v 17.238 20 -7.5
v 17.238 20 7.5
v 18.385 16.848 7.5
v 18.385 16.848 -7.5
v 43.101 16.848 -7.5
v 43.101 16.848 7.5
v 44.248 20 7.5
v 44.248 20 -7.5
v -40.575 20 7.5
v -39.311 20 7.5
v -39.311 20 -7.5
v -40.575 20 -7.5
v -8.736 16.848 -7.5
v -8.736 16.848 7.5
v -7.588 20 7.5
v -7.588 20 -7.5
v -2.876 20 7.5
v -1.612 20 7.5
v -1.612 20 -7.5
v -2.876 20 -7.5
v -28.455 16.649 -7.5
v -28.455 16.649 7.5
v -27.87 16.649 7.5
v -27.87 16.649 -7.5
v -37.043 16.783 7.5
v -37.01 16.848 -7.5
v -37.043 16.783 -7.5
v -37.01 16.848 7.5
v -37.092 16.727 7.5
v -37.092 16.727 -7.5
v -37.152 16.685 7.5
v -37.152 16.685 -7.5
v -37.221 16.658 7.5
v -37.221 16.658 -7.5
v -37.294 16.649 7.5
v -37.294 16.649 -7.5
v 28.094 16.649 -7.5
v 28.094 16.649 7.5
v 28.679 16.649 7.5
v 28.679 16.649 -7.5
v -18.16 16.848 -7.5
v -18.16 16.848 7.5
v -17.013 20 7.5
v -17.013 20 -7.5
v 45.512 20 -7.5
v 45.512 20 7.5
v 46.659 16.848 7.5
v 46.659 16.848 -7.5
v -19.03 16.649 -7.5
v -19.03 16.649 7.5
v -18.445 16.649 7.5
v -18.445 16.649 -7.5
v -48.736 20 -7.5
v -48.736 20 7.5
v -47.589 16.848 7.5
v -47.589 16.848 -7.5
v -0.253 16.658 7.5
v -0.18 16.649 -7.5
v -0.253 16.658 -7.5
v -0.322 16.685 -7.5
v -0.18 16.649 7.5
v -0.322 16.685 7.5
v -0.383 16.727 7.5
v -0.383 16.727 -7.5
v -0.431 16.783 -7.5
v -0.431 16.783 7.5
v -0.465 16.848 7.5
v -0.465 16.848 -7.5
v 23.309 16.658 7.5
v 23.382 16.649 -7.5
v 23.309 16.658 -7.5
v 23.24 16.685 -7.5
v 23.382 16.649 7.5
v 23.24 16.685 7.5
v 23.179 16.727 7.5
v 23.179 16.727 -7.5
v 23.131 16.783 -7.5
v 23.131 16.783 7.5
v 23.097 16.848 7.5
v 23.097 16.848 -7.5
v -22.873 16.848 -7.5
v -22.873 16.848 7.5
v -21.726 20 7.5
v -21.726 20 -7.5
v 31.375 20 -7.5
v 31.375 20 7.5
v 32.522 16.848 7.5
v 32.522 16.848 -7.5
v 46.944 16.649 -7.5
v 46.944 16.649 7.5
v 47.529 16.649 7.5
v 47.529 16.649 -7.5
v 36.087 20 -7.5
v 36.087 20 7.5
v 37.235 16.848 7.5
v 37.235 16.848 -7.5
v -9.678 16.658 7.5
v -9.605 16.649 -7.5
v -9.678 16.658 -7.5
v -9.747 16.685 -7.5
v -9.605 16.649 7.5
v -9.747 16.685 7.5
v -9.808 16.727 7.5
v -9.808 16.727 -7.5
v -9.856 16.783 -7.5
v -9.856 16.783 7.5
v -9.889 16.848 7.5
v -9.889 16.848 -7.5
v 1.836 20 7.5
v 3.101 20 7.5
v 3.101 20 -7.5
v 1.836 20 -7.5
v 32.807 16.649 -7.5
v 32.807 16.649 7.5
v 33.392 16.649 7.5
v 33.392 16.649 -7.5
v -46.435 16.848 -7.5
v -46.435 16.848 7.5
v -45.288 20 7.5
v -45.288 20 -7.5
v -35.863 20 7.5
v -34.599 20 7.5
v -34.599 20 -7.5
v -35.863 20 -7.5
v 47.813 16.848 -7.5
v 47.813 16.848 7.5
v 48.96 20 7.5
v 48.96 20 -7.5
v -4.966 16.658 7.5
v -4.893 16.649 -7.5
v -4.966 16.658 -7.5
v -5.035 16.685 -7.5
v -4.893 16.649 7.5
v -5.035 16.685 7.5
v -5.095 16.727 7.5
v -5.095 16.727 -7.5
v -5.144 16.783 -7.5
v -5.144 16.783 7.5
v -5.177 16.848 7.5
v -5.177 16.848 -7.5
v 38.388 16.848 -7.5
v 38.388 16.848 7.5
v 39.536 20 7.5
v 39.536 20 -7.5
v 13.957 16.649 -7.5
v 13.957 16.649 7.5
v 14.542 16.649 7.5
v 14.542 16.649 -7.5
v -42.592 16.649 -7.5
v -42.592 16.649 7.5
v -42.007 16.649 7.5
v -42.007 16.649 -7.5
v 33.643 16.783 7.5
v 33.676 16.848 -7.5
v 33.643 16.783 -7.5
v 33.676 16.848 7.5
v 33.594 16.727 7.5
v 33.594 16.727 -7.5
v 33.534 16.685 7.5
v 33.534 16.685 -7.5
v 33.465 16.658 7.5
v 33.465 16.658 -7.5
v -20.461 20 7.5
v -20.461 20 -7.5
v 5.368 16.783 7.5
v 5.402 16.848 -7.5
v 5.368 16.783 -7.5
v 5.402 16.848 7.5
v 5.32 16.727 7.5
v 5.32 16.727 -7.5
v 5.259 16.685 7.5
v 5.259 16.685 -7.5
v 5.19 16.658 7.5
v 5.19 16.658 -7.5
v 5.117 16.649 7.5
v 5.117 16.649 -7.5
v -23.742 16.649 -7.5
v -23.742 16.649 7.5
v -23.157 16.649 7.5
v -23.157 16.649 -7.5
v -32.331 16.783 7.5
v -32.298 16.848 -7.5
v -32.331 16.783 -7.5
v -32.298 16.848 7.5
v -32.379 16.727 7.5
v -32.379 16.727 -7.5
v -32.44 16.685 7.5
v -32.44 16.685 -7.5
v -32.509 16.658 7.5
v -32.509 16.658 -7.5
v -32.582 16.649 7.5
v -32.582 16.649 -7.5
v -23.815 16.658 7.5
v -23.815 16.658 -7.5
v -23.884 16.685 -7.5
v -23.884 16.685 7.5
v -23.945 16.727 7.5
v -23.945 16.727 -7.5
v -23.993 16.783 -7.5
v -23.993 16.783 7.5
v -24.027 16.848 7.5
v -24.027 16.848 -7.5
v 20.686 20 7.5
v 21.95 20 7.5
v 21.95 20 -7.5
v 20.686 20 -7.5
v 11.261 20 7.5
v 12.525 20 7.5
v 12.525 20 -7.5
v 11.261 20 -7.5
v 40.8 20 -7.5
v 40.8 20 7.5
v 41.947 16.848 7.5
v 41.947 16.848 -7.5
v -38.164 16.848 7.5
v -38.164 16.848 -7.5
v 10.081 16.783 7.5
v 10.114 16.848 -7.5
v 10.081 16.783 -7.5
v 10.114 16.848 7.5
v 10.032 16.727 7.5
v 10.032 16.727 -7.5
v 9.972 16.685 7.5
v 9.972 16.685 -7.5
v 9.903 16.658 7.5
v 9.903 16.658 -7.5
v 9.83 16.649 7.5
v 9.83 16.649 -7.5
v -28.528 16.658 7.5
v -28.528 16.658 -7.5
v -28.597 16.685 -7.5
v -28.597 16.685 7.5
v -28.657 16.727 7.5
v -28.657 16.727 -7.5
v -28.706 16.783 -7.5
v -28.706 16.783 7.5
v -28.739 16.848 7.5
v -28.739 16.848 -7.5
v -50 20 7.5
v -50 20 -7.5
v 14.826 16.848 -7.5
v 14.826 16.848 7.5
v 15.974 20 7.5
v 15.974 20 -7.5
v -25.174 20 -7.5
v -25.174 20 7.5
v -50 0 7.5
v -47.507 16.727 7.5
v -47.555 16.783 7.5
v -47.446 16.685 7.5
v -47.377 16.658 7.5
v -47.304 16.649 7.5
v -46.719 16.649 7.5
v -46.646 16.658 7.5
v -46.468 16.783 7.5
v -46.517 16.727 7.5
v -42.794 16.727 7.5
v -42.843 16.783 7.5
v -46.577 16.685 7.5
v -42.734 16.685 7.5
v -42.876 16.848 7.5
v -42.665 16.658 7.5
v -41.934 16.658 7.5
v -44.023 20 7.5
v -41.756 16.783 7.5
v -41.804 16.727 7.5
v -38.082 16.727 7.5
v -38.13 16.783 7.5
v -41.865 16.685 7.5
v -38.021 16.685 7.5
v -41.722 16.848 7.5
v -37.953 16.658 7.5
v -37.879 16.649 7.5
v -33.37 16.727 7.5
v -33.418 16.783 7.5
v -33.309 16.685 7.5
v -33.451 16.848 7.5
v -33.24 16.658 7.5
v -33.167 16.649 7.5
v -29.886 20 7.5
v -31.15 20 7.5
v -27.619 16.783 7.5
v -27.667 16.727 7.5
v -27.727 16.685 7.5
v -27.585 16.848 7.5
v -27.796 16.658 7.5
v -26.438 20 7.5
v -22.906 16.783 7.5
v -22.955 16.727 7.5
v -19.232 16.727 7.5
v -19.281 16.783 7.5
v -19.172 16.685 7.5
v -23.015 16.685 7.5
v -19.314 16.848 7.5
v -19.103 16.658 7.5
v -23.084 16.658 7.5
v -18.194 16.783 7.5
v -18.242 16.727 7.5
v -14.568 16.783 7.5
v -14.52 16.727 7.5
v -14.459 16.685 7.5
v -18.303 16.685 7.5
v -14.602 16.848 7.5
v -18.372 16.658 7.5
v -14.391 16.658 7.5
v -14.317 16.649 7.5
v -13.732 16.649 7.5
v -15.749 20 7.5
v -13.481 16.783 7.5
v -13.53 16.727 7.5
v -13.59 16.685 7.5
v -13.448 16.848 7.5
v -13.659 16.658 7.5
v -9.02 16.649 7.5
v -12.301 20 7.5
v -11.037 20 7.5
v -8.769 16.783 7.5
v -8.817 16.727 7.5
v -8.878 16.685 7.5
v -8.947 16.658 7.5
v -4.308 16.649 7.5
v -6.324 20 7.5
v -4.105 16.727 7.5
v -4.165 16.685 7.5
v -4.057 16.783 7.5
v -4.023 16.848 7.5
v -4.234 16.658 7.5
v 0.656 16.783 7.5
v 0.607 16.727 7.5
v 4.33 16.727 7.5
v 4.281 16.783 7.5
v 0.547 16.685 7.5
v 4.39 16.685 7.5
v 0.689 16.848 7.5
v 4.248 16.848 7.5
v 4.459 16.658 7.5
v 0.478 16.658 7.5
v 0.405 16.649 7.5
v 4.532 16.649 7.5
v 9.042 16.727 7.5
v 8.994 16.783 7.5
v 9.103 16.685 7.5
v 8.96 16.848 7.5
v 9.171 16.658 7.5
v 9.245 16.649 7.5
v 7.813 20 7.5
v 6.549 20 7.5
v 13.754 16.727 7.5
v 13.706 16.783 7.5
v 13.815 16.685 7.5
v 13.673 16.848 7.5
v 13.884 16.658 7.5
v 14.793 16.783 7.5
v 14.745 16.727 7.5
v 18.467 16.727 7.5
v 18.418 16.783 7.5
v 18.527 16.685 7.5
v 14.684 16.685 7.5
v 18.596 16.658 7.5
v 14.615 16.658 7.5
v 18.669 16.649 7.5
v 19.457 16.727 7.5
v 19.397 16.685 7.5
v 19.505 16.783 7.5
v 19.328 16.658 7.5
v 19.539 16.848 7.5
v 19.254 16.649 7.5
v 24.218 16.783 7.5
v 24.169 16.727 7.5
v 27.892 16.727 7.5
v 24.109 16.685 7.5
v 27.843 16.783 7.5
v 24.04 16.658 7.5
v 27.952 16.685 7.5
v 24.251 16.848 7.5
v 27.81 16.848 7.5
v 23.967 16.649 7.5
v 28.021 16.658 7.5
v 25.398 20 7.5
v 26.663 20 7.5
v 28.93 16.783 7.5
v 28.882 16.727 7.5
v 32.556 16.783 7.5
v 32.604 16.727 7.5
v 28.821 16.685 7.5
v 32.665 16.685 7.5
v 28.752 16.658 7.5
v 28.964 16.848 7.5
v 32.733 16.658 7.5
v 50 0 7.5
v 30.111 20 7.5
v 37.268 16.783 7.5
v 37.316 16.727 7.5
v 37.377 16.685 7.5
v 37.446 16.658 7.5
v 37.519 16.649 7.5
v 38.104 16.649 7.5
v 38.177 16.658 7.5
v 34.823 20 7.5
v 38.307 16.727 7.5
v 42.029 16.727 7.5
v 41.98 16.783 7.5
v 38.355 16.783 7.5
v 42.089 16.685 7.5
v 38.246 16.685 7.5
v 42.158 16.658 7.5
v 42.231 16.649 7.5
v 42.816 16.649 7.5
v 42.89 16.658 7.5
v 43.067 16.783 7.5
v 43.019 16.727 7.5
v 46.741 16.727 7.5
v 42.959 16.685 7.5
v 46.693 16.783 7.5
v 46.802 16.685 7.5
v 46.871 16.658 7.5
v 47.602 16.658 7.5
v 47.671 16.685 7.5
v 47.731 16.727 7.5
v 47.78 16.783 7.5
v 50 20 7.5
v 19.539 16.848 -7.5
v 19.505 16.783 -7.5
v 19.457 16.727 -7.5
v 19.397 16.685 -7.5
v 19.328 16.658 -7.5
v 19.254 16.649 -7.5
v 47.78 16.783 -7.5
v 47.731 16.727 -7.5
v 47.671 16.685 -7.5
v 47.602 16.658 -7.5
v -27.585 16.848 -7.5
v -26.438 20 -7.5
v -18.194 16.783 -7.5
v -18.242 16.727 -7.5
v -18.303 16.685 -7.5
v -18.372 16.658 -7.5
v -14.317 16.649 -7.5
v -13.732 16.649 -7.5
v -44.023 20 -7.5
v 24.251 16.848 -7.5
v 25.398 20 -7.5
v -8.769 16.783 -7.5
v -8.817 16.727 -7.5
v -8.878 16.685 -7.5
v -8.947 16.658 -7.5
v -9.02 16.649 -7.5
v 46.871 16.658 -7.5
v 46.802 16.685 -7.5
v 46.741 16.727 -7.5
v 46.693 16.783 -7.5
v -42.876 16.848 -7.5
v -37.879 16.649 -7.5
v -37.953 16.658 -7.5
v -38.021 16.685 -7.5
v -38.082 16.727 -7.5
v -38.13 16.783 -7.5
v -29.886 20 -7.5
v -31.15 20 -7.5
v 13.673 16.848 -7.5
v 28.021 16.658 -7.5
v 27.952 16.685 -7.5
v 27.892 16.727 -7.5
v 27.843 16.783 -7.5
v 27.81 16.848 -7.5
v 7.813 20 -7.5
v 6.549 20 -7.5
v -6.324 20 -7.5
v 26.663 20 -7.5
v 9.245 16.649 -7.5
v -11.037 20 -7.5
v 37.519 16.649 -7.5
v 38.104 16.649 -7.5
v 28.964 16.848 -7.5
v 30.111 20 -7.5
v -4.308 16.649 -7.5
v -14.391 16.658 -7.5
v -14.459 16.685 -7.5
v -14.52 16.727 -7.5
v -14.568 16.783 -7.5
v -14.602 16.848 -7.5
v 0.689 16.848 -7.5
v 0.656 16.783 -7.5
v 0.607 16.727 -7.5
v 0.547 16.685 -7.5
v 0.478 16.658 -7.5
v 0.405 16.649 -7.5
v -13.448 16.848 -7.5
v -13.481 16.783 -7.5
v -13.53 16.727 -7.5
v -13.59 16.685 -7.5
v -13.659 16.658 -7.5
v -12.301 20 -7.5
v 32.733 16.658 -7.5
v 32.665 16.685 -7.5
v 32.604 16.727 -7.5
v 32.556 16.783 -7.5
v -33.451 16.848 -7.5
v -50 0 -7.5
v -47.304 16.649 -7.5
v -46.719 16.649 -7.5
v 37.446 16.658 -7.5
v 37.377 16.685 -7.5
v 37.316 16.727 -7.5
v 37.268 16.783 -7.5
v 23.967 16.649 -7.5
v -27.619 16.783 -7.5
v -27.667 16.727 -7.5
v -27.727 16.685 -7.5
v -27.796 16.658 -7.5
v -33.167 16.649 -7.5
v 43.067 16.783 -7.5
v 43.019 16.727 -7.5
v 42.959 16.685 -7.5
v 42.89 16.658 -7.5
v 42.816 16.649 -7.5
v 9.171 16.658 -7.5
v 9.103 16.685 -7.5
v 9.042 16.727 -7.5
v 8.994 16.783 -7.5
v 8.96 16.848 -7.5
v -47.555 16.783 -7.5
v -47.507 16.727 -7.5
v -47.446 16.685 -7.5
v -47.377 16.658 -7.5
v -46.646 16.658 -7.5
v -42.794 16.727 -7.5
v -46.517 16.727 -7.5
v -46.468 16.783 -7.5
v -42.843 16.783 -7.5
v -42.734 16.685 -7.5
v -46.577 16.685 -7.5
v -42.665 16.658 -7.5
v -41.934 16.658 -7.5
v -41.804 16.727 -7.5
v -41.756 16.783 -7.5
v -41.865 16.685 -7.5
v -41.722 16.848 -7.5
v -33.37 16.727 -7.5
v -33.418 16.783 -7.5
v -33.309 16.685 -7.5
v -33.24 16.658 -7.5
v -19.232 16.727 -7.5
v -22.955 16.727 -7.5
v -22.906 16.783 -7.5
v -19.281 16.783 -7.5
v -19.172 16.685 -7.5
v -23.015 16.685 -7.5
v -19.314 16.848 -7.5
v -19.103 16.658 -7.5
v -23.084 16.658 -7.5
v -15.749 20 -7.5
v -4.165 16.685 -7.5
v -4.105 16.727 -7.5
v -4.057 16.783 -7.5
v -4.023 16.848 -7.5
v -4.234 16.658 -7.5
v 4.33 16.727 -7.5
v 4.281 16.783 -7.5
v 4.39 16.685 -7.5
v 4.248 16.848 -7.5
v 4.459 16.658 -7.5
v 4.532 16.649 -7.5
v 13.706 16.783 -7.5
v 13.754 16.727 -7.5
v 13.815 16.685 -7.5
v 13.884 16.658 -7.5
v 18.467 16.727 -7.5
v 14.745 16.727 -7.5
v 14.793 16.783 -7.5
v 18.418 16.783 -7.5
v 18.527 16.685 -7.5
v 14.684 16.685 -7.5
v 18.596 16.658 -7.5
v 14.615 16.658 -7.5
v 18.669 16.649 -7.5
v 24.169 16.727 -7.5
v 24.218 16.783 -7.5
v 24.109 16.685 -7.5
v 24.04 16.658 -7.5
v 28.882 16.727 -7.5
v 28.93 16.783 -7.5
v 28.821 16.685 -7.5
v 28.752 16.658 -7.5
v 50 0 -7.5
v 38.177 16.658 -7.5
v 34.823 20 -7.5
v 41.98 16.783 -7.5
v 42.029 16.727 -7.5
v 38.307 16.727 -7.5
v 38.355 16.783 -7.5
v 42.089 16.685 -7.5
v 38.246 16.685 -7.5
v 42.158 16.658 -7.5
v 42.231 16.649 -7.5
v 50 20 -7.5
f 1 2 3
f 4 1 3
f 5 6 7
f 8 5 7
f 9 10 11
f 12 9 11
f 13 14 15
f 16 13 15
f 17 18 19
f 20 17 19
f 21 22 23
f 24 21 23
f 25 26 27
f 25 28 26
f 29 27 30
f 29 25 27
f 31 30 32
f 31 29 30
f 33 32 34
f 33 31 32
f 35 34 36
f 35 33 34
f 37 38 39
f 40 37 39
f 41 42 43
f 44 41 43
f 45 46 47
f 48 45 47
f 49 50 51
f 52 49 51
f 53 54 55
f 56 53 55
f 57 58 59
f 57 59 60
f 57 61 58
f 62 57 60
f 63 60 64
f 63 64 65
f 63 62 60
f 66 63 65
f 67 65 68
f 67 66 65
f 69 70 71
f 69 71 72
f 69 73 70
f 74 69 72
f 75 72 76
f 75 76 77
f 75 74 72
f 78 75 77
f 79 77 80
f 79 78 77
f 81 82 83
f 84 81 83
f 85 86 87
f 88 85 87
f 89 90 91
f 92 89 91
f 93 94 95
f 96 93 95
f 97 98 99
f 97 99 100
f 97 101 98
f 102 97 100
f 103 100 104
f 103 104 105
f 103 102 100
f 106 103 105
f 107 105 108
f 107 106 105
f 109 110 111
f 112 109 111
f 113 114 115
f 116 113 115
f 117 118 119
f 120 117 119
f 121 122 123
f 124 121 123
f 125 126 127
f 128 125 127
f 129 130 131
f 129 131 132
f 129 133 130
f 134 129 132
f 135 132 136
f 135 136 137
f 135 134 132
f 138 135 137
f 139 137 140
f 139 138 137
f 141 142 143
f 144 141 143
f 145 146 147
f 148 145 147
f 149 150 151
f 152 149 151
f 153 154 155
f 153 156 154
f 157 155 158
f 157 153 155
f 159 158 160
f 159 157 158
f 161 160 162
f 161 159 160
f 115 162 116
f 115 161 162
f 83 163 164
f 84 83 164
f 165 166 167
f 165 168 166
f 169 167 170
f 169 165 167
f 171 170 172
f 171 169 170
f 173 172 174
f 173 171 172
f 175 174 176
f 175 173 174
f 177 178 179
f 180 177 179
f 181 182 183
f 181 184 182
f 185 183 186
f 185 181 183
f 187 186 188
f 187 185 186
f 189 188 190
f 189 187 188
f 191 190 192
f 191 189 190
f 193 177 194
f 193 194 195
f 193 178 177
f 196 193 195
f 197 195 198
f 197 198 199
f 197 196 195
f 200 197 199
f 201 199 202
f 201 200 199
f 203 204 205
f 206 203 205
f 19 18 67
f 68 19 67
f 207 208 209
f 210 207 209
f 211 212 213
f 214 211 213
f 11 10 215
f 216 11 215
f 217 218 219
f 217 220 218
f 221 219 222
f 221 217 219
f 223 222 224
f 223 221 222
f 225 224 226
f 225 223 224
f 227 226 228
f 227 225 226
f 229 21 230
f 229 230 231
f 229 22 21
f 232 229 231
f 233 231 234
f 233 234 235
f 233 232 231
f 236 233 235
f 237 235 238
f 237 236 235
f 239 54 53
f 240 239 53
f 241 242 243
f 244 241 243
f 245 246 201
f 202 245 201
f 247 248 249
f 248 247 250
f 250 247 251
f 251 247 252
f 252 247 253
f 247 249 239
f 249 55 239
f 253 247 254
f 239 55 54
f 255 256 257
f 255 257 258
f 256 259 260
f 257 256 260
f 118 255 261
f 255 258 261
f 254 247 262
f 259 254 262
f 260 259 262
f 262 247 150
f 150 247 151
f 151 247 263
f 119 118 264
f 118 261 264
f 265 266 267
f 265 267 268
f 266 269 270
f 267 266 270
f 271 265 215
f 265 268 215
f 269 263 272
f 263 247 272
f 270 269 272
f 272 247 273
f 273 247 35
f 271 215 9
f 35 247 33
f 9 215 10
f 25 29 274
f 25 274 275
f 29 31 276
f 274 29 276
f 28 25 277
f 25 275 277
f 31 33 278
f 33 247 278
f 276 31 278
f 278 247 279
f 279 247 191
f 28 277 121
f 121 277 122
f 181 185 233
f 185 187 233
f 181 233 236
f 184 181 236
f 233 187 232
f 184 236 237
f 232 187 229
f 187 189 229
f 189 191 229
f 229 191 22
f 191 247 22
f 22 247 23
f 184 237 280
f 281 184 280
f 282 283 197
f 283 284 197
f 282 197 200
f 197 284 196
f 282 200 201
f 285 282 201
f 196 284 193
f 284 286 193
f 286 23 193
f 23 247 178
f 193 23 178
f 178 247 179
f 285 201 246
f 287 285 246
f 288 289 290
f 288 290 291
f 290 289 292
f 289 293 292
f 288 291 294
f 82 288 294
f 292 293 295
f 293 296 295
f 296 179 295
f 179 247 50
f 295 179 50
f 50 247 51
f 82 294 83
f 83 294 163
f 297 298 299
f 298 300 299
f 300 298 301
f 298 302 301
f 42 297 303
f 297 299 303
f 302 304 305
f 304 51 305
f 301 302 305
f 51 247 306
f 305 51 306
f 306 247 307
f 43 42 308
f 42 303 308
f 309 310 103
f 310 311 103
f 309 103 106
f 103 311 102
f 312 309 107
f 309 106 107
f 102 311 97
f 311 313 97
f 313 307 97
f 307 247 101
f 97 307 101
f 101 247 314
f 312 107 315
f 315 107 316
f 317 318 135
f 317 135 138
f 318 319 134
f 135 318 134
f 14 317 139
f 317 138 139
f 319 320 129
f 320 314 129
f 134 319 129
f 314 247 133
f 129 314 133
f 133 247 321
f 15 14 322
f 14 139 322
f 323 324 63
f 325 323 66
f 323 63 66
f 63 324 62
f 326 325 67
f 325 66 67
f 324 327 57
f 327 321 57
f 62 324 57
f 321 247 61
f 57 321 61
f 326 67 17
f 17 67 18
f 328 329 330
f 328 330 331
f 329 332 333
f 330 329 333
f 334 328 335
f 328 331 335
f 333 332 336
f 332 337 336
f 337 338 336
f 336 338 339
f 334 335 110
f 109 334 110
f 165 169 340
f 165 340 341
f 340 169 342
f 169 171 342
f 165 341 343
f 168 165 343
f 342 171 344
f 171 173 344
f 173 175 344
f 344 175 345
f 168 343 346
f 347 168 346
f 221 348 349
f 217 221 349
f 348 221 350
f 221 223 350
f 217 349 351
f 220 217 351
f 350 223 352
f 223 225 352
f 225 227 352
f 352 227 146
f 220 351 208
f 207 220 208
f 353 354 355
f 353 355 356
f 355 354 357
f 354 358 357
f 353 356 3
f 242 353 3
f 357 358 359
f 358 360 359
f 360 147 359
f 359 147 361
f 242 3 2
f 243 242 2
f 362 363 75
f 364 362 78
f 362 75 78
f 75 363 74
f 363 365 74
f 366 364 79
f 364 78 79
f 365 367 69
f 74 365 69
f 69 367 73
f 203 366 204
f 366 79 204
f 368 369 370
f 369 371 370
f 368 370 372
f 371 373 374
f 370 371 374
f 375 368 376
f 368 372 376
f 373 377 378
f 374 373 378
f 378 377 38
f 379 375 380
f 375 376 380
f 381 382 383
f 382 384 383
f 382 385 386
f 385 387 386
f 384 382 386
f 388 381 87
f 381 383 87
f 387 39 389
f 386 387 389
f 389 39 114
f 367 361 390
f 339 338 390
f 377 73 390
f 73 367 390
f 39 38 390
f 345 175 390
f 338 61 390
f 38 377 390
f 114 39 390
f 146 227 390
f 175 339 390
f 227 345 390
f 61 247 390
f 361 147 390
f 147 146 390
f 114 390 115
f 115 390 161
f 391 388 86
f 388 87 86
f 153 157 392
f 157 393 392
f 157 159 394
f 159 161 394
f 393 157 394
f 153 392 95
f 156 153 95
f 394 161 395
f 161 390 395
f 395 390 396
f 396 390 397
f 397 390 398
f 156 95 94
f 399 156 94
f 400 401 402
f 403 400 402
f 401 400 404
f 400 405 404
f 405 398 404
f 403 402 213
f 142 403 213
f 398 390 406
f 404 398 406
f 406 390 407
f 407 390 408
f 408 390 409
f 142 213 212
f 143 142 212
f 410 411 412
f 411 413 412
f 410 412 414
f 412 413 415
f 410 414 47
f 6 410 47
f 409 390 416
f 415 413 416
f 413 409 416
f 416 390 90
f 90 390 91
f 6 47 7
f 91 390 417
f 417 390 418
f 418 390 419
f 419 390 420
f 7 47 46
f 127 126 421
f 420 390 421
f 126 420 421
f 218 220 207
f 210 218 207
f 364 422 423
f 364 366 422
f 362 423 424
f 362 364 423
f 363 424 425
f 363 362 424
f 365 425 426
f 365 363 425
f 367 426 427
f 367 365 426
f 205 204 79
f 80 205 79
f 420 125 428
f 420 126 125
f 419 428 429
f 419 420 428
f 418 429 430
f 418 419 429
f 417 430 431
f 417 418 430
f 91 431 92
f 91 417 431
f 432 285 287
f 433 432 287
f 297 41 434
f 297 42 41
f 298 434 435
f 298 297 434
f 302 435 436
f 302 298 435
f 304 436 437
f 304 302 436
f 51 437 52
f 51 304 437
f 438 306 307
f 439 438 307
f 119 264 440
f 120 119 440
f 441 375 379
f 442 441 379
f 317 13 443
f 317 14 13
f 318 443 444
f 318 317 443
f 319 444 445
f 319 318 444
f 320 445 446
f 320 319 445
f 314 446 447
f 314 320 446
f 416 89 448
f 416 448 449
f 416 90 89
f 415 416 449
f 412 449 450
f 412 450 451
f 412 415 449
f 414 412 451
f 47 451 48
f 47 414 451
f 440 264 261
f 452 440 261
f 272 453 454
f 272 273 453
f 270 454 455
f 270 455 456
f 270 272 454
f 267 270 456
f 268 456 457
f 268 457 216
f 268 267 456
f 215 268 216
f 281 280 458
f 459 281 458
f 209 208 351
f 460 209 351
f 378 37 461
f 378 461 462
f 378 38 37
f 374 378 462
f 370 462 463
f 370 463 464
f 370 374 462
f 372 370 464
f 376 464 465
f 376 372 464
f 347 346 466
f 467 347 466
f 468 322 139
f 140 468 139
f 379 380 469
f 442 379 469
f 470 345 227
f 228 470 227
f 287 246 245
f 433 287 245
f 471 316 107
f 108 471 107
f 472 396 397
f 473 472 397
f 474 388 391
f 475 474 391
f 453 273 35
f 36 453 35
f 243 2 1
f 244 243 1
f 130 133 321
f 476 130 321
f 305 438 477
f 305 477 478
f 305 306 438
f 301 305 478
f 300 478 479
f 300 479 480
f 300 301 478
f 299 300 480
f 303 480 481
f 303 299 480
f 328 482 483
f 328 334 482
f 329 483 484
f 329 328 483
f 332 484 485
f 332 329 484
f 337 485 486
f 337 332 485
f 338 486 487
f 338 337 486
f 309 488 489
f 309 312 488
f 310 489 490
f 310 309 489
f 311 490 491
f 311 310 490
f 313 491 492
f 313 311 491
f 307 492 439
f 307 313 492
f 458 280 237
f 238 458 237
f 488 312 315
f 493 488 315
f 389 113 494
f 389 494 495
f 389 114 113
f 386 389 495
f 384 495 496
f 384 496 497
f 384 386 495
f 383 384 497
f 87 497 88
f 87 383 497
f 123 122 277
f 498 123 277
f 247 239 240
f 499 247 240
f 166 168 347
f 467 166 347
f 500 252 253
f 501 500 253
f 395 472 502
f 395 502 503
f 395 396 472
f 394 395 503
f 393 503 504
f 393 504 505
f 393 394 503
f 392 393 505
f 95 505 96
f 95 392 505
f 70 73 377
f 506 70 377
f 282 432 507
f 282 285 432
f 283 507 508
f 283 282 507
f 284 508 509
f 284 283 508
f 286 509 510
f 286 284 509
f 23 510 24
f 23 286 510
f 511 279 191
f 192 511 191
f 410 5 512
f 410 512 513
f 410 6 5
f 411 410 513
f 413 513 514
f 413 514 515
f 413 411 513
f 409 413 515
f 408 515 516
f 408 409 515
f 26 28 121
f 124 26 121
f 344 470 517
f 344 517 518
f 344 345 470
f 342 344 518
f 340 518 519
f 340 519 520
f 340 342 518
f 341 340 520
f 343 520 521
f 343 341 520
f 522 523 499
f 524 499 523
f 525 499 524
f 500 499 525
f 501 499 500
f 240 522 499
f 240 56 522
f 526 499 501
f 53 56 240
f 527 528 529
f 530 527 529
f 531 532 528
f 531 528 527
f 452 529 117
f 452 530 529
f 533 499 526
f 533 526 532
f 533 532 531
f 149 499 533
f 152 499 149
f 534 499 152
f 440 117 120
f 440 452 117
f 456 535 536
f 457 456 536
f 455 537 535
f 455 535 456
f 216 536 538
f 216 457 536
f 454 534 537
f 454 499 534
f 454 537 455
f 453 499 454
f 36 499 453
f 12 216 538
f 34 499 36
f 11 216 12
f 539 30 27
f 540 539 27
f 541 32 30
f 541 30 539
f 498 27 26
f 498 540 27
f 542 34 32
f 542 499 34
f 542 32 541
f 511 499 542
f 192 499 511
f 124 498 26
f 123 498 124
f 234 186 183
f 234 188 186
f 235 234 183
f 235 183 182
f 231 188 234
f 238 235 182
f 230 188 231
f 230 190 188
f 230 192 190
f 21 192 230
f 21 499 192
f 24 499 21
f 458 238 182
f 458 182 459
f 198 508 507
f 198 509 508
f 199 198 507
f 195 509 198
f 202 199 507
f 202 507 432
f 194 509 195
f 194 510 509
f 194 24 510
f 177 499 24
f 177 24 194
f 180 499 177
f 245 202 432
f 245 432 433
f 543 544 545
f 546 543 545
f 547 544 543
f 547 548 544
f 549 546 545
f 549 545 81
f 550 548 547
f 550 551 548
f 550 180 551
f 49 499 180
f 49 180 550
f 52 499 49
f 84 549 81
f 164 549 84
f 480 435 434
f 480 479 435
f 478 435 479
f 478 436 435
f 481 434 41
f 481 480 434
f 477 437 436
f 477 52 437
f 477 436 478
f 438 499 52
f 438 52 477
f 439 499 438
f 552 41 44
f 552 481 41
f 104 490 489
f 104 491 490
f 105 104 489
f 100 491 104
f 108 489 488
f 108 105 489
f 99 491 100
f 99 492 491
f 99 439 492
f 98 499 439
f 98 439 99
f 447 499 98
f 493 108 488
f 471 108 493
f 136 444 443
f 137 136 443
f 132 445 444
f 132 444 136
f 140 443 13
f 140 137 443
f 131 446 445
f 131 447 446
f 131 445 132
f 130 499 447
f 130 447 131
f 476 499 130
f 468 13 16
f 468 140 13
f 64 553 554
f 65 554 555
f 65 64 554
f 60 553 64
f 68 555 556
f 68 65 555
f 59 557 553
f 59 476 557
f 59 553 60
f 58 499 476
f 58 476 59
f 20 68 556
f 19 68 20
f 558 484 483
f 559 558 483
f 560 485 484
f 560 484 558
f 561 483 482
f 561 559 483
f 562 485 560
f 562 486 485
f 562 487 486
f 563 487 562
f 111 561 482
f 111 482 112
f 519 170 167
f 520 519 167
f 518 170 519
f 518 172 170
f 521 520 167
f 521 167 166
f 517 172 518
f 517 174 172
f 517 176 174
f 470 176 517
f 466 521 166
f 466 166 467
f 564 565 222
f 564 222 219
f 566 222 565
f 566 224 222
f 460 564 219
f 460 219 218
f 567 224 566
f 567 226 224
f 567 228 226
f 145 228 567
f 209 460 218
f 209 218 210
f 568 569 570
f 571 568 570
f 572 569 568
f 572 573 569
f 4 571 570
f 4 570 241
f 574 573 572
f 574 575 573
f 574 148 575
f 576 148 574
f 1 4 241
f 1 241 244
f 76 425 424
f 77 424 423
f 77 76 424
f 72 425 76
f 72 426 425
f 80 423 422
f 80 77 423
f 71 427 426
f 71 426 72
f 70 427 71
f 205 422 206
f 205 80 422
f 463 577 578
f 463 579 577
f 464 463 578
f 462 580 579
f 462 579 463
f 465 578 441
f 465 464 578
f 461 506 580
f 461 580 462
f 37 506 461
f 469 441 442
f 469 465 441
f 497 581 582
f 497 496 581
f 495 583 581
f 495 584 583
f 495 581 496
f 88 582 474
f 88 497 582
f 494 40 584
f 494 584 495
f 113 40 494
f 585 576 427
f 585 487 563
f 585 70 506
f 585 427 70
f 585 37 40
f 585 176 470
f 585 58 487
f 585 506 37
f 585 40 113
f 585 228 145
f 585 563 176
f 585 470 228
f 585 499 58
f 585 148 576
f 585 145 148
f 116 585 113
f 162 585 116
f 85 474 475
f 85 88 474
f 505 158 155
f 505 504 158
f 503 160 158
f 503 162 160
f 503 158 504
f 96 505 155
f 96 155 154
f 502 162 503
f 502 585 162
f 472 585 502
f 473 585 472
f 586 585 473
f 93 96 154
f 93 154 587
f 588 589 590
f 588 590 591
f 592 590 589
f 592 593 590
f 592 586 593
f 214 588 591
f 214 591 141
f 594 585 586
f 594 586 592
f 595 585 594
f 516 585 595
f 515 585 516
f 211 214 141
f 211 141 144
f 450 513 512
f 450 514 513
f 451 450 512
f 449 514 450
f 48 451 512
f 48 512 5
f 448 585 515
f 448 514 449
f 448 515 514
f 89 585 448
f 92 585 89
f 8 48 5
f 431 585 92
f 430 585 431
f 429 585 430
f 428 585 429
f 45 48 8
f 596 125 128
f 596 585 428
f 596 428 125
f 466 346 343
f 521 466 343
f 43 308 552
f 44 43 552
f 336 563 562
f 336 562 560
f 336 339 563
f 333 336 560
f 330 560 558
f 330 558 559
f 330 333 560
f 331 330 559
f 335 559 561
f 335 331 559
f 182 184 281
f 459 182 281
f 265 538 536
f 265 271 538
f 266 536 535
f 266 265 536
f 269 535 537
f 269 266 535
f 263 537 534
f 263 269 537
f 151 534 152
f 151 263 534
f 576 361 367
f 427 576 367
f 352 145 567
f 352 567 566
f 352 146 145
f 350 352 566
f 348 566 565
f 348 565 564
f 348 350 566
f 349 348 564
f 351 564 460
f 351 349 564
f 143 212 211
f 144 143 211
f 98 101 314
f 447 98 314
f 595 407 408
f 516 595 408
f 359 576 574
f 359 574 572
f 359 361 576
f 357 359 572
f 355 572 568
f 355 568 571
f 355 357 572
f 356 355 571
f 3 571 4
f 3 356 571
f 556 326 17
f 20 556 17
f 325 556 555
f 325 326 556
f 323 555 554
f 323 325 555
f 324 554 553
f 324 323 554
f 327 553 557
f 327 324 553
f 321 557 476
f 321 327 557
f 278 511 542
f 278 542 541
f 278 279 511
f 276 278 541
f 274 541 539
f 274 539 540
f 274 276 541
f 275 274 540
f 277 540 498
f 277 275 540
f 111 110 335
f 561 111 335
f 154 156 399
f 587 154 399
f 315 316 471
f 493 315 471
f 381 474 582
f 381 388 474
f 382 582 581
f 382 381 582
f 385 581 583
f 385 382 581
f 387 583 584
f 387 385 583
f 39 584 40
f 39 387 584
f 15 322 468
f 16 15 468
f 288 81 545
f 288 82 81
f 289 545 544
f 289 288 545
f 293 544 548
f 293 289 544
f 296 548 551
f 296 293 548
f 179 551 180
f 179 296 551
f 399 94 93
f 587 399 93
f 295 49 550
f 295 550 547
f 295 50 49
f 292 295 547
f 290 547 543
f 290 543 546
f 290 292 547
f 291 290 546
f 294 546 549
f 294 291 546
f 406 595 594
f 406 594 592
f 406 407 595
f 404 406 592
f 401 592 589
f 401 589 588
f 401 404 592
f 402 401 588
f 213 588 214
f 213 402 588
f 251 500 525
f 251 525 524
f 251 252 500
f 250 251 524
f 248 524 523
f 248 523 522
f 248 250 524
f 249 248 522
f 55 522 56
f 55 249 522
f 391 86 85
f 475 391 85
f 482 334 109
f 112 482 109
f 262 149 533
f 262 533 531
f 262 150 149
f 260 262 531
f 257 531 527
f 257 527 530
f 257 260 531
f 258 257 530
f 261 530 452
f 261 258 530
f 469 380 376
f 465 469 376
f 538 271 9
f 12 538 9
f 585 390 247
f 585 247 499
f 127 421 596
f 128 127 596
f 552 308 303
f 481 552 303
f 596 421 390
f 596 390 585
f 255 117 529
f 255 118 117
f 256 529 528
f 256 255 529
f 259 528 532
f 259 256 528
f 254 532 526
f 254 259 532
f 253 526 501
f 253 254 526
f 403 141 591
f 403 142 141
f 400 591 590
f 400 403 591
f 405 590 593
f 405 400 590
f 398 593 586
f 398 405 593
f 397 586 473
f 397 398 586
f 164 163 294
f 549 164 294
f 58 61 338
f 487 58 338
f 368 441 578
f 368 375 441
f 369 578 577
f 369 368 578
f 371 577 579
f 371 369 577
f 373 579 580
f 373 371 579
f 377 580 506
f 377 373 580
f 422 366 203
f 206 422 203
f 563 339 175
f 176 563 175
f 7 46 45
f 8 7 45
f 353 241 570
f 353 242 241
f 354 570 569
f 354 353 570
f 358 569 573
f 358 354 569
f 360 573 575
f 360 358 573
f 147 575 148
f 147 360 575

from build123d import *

# Parameters (mm, degrees)
SKETCH2_W                = 15
SKETCH2_H                = 20
BOSS_EXTRUDE1_DEPTH      = 50
BOSS_EXTRUDE1_DEPTH_BACK = 50
CUT_EXTRUDE1_DEPTH       = 8.5
FILLET1_R                = 0.302678334
LPATTERN1_COUNT          = 21
LPATTERN1_PITCH          = 4.7124
FILLET1_OF_LPATTERN1_R   = 0.302678334


with BuildPart() as part:
    # Sketch2 → Boss-Extrude1 (new body, two sides)
    with BuildSketch(Plane(origin=(0, 0, 0), x_dir=(0, 0, -1), z_dir=(1, 0, 0))) as boss_extrude1_sk:
        with Locations((0, 10)):
            Rectangle(SKETCH2_W, SKETCH2_H)
    extrude(amount=BOSS_EXTRUDE1_DEPTH)
    extrude(boss_extrude1_sk.sketch, amount=-BOSS_EXTRUDE1_DEPTH_BACK)

    # Sketch3 → Cut-Extrude1 (cut, symmetric)
    with BuildSketch(Plane.XY):
        Polygon((-48.735710703, 20), (-47.516119242, 16.6492), (-46.507191461, 16.6492), (-45.2876, 20), align=None)
    cut_extrude1 = extrude(amount=CUT_EXTRUDE1_DEPTH, both=True, mode=Mode.SUBTRACT)

    # Fillet1
    fillet1_edges = [part.edges().sort_by_distance(p)[0] for p in [
        (-46.507191461, 16.6492, 0),
        (-47.516119242, 16.6492, 0),
    ]]
    fillet(fillet1_edges, radius=FILLET1_R)

    # LPattern1: Cut-Extrude1 ×21
    with Locations(*[(i * LPATTERN1_PITCH, 0, 0) for i in range(1, LPATTERN1_COUNT)]):
        add(cut_extrude1, mode=Mode.SUBTRACT)

    # Fillet1 of LPattern1
    fillet1_of_lpattern1_edges = [part.edges().sort_by_distance(p)[0] for p in [
        (-41.794791461, 16.6492, 0),
        (-42.803719242, 16.6492, 0),
        (-37.082391461, 16.6492, 0),
        (-38.091319242, 16.6492, 0),
        (-32.369991461, 16.6492, 0),
        (-33.378919242, 16.6492, 0),
        (-27.657591461, 16.6492, 0),
        (-28.666519242, 16.6492, 0),
        (-22.945191461, 16.6492, 0),
        (-23.954119242, 16.6492, 0),
        (-18.232791461, 16.6492, 0),
        (-19.241719242, 16.6492, 0),
        (-13.520391461, 16.6492, 0),
        (-14.529319242, 16.6492, 0),
        (-8.807991461, 16.6492, 0),
        (-9.816919242, 16.6492, 0),
        (-4.095591461, 16.6492, 0),
        (-5.104519242, 16.6492, 0),
        (0.616808539, 16.6492, 0),
        (-0.392119242, 16.6492, 0),
        (5.329208539, 16.6492, 0),
        (4.320280758, 16.6492, 0),
        (10.041608539, 16.6492, 0),
        (9.032680758, 16.6492, 0),
        (14.754008539, 16.6492, 0),
        (13.745080758, 16.6492, 0),
        (19.466408539, 16.6492, 0),
        (18.457480758, 16.6492, 0),
        (24.178808539, 16.6492, 0),
        (23.169880758, 16.6492, 0),
        (28.891208539, 16.6492, 0),
        (27.882280758, 16.6492, 0),
        (33.603608539, 16.6492, 0),
        (32.594680758, 16.6492, 0),
        (38.316008539, 16.6492, 0),
        (37.307080758, 16.6492, 0),
        (43.028408539, 16.6492, 0),
        (42.019480758, 16.6492, 0),
        (47.740808539, 16.6492, 0),
        (46.731880758, 16.6492, 0),
    ]]
    fillet(fillet1_of_lpattern1_edges, radius=FILLET1_OF_LPATTERN1_R)


solid = part.part
